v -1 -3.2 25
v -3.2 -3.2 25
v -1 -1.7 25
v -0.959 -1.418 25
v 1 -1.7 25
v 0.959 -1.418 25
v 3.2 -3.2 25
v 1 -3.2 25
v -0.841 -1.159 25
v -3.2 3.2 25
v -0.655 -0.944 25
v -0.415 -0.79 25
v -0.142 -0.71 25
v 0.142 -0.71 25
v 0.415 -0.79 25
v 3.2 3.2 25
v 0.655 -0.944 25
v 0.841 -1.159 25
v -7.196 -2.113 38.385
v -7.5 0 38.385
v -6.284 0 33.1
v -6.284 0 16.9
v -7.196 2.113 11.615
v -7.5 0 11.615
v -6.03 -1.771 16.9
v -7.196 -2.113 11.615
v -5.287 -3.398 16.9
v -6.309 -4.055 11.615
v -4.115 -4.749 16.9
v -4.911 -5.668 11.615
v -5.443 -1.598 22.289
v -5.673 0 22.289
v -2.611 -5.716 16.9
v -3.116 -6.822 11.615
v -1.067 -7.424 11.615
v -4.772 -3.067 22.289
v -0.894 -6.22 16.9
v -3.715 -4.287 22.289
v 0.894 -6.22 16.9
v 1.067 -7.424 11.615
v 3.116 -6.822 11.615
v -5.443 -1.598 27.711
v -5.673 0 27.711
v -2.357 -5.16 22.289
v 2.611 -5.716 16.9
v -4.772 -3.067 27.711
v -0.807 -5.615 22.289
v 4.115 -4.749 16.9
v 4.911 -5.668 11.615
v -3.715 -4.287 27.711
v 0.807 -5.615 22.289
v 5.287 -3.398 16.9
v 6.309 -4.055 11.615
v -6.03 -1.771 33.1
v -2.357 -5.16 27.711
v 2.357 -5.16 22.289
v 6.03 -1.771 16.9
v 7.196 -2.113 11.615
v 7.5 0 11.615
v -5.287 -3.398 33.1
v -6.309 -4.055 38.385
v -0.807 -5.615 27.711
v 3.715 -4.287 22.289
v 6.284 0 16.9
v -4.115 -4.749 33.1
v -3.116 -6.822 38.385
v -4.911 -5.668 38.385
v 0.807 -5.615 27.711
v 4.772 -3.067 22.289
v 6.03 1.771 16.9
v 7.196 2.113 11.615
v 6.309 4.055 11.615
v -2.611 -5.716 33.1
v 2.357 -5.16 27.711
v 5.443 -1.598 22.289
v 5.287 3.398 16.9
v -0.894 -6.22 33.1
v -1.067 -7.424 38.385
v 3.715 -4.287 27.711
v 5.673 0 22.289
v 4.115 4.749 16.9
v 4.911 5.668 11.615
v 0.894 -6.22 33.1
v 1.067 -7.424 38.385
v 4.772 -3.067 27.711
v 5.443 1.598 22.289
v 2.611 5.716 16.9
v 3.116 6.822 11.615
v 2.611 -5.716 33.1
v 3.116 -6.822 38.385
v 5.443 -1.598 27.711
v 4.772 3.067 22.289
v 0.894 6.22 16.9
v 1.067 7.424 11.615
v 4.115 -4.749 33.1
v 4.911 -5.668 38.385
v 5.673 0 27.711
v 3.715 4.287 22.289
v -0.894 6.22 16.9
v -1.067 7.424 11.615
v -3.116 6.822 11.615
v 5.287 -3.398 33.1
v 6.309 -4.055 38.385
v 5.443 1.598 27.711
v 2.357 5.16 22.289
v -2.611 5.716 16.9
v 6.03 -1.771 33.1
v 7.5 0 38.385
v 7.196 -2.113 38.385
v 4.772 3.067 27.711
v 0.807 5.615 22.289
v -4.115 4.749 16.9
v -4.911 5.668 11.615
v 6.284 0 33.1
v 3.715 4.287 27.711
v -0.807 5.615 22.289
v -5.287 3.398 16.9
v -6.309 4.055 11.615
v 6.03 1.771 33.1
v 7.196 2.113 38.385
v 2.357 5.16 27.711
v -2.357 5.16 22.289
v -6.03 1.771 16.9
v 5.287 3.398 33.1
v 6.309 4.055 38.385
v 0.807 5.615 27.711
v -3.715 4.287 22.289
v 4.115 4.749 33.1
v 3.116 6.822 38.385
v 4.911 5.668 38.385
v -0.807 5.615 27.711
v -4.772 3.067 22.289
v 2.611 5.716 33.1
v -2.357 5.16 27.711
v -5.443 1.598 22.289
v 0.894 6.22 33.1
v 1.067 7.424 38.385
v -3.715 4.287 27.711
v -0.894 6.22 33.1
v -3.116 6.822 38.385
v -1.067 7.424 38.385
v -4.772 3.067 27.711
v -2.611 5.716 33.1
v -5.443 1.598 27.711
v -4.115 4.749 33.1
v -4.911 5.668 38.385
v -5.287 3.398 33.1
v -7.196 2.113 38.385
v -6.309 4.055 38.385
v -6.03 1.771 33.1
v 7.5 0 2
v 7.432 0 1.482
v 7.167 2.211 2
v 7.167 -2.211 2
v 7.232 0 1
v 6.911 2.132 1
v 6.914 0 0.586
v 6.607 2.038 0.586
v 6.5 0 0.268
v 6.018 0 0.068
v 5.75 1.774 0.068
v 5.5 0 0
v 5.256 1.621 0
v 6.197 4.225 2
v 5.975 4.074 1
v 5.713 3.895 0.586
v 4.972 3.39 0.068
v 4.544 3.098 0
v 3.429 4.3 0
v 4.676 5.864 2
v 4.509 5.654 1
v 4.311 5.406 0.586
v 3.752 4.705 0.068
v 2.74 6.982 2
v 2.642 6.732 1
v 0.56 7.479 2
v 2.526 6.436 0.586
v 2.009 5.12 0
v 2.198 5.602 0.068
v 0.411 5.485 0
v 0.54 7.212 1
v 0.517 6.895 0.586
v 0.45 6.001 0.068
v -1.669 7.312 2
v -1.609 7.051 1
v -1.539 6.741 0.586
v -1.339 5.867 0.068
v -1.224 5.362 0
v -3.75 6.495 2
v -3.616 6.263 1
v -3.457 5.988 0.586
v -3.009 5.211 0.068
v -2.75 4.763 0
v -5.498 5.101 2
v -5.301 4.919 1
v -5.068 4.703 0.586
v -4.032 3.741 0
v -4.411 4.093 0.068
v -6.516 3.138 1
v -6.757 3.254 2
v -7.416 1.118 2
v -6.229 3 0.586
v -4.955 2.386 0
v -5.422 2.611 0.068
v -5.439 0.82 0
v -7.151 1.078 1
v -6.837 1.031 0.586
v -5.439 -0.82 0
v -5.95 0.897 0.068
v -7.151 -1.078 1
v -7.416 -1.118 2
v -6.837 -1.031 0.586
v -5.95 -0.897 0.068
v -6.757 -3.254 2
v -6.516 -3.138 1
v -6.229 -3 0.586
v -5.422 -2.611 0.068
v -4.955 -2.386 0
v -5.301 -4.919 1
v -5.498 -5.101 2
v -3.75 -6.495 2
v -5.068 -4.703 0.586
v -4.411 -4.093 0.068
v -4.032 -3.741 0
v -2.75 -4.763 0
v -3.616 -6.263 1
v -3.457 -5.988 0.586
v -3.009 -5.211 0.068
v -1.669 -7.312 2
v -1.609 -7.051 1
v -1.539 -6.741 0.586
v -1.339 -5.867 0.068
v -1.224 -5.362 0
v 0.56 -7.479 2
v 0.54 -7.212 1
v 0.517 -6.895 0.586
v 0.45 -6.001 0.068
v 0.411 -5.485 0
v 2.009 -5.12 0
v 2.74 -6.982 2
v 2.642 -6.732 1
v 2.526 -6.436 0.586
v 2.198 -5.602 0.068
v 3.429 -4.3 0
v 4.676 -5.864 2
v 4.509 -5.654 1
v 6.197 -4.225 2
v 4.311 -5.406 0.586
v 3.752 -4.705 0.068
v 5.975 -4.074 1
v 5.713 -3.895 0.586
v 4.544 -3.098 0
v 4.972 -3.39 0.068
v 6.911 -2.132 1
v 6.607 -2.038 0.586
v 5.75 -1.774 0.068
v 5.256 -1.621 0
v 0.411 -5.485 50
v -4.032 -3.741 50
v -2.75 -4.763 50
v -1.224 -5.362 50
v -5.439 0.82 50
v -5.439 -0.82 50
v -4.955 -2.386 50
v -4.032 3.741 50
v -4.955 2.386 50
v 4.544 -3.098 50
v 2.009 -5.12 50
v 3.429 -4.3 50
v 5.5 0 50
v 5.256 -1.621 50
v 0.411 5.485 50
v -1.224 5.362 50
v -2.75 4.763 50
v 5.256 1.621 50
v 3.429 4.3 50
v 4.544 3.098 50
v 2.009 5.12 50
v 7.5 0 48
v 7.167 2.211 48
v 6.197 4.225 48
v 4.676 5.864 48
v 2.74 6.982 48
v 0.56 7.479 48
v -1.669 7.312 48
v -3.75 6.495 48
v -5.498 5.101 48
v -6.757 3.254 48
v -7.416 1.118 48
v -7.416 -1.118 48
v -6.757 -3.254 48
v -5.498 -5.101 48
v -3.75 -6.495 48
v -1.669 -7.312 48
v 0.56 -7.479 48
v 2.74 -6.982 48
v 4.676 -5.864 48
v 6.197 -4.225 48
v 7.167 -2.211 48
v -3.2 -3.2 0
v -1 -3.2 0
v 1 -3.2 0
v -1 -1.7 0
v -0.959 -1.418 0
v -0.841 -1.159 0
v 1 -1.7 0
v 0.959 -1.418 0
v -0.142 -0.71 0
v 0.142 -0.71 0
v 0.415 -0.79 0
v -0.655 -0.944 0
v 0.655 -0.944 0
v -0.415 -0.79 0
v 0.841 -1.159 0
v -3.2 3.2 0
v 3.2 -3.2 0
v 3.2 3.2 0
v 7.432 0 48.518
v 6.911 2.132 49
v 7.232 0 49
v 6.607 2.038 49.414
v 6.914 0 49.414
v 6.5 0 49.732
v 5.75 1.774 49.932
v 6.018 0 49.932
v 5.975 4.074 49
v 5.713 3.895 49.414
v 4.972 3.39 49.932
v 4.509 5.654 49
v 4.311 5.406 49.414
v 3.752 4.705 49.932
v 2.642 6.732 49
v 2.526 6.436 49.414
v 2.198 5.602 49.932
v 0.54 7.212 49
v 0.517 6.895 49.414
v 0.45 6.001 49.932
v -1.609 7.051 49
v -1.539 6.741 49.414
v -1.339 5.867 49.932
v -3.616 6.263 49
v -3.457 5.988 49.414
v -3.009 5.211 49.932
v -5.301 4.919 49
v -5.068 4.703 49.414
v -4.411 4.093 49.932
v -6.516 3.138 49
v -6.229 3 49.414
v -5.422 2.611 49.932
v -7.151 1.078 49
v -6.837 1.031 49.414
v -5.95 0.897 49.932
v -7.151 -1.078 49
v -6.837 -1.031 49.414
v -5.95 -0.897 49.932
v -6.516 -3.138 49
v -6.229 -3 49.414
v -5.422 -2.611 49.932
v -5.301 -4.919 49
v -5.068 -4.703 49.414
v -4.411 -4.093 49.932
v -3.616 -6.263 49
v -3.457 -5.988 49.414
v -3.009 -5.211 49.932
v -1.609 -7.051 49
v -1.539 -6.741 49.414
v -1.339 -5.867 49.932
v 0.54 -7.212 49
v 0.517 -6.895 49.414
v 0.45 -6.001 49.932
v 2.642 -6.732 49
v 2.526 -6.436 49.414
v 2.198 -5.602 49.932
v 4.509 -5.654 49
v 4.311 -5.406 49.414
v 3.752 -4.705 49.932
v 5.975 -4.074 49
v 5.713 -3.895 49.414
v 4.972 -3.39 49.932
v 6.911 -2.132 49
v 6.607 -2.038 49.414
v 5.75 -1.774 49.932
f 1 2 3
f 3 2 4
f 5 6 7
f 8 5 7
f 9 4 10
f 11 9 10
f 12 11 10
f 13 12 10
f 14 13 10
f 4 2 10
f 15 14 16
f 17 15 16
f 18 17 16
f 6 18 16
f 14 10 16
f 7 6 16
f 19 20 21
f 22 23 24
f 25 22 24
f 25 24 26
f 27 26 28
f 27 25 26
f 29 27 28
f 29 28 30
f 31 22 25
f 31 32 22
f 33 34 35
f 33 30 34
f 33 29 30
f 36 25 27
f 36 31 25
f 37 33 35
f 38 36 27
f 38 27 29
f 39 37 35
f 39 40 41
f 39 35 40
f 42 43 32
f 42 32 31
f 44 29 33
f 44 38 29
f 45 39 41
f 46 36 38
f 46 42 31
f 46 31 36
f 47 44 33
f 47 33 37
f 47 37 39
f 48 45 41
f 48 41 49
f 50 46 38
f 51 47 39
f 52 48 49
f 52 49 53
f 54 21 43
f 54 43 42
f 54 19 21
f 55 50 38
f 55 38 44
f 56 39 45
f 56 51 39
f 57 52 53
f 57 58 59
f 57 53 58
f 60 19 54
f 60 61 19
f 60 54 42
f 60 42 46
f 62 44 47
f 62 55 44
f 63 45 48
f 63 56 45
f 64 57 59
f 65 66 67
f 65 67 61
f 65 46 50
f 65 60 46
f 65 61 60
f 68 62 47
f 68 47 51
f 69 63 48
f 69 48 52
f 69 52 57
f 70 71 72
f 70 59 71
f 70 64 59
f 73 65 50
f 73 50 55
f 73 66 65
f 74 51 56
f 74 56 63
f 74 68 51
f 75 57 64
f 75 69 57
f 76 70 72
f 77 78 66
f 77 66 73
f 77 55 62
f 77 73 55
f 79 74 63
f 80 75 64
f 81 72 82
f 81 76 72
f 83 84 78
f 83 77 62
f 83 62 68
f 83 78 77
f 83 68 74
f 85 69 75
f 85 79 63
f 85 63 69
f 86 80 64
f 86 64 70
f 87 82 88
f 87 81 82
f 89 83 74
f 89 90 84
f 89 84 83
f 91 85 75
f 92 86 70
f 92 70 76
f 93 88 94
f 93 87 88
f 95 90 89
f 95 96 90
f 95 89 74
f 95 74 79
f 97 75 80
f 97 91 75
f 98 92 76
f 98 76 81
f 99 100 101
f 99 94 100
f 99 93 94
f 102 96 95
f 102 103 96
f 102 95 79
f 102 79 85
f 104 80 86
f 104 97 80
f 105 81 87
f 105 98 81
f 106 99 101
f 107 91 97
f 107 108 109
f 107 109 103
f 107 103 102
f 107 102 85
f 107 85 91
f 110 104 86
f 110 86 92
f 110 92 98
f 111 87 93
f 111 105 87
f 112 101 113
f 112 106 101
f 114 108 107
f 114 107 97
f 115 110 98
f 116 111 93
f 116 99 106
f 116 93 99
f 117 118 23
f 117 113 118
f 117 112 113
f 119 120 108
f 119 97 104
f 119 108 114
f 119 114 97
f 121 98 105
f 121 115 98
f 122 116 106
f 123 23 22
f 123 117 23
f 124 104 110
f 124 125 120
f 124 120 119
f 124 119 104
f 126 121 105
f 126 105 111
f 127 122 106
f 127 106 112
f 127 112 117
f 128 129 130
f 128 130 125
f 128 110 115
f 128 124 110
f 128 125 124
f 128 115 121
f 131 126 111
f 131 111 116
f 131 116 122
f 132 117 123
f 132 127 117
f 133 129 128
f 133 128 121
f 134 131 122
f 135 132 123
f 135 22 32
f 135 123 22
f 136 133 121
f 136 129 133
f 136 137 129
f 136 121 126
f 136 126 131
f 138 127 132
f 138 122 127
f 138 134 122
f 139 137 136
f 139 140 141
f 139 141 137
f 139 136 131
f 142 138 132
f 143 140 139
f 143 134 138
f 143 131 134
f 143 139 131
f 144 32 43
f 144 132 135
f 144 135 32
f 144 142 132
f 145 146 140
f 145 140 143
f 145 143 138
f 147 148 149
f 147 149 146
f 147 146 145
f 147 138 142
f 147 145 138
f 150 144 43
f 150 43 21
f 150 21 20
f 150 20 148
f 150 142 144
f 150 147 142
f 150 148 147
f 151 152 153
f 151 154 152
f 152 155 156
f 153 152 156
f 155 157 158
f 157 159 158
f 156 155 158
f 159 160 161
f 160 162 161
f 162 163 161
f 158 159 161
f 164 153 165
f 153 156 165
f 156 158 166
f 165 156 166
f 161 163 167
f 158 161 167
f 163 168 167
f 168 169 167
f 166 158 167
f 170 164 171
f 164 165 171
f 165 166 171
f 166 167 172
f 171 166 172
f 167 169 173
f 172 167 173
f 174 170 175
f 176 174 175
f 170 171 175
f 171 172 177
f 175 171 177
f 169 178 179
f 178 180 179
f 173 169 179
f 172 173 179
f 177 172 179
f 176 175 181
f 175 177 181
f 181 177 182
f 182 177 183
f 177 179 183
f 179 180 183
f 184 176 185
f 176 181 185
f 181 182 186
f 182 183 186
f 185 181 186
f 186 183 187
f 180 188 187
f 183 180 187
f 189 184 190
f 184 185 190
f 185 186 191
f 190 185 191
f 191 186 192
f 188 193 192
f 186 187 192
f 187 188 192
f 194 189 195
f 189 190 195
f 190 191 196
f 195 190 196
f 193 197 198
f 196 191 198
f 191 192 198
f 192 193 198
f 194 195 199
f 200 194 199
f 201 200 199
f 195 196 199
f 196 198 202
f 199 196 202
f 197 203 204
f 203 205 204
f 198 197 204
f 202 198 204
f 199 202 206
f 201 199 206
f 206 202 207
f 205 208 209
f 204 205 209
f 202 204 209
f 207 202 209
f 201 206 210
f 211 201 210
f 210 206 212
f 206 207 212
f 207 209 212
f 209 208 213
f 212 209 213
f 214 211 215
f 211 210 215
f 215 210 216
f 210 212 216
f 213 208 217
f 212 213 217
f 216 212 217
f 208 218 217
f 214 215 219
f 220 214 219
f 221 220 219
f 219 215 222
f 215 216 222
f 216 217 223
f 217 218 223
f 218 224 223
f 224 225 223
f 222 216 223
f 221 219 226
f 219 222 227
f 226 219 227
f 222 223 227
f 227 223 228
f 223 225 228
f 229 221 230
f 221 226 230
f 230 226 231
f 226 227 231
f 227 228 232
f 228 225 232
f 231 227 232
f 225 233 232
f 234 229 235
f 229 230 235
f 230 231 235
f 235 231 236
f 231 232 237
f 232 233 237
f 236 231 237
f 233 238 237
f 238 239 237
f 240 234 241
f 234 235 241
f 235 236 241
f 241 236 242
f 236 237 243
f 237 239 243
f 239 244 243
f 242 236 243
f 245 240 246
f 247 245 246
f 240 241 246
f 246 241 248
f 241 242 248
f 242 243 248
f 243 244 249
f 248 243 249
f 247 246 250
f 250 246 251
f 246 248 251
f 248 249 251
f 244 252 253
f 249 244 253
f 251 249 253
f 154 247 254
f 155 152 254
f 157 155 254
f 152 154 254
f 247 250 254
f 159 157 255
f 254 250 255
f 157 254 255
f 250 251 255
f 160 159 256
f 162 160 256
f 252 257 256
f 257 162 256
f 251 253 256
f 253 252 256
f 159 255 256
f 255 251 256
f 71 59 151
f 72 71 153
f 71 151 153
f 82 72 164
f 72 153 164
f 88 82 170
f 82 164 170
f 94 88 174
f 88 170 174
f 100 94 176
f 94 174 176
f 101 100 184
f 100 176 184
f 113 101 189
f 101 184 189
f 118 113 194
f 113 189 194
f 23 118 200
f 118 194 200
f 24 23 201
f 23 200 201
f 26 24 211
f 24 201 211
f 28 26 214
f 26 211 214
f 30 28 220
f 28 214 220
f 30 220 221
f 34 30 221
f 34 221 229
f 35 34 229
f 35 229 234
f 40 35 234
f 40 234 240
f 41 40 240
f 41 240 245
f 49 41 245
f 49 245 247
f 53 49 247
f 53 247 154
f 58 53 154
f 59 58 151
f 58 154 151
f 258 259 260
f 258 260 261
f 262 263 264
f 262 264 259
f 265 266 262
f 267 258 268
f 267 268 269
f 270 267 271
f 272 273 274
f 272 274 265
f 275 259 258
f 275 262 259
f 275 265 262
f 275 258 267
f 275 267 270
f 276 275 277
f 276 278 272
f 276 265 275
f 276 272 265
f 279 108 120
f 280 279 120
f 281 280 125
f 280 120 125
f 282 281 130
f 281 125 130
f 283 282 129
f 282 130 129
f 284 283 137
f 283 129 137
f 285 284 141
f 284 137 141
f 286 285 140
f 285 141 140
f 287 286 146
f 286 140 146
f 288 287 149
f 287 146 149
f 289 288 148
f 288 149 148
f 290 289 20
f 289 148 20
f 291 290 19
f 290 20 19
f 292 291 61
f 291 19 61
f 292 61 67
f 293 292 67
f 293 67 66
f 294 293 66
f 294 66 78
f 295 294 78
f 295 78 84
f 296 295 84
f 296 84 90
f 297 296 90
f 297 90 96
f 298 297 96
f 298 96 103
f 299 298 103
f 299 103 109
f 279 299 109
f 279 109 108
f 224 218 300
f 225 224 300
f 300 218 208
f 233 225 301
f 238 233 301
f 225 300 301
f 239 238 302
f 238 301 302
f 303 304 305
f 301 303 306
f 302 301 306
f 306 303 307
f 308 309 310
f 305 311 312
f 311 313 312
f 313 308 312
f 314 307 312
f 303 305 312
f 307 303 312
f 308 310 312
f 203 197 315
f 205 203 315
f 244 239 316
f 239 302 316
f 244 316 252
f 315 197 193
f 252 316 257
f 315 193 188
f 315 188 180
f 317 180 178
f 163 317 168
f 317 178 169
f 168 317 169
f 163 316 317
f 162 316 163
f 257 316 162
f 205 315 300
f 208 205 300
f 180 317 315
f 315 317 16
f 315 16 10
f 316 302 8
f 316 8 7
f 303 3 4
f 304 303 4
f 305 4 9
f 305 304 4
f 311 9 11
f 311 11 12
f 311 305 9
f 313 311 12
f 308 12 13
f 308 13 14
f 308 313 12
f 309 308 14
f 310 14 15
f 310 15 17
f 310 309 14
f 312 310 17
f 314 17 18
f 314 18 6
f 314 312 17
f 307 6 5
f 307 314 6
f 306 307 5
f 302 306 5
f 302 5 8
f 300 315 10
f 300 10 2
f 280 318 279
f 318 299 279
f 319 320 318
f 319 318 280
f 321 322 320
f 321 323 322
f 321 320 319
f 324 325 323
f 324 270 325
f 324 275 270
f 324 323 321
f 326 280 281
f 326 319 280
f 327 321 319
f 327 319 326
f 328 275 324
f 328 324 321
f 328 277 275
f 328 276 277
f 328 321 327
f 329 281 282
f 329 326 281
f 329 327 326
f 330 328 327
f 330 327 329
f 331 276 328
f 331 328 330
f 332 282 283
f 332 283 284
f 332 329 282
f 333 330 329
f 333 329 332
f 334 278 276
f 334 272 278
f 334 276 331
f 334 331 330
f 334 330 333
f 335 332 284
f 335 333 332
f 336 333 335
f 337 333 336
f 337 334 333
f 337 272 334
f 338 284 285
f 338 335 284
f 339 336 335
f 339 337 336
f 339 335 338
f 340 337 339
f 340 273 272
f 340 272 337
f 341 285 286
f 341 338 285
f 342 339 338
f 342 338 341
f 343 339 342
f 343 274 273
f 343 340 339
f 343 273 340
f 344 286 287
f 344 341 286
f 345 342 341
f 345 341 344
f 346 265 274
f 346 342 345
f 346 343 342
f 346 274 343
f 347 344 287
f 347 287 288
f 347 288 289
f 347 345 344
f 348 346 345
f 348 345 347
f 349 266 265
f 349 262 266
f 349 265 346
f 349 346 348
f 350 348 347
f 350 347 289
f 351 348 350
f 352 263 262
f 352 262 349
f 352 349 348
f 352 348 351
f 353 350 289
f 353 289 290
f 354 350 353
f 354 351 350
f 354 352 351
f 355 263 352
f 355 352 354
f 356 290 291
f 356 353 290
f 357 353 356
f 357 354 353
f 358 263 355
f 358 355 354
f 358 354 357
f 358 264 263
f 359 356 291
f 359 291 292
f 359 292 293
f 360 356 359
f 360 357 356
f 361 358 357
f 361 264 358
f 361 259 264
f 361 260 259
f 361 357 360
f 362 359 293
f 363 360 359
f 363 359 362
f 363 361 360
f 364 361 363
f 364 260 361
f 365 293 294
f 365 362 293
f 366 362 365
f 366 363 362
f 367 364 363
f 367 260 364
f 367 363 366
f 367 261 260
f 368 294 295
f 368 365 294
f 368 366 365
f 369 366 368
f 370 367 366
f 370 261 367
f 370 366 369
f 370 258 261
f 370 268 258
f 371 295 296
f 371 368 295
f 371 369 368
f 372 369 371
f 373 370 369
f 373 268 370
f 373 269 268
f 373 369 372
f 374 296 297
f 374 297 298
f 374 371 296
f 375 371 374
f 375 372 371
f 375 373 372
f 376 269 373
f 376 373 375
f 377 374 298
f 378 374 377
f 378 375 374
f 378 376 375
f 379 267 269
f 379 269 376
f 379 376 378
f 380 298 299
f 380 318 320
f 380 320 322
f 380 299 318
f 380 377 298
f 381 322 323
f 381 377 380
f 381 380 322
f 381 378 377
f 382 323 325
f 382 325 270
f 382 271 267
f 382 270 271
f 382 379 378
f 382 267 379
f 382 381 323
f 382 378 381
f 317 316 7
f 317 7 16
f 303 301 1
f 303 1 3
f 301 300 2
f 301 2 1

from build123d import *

# Parameters (mm, degrees)
F0_R     = 7.5
F1_DEPTH = 50
F3_DEPTH = 25
F6_R     = 2


with BuildPart() as f1:
    # F0 (on Top) → F1 (new body)
    with BuildSketch(Plane.XY):
        Circle(F0_R)
    extrude(amount=F1_DEPTH)

    # F2 (on Top) → F3 (cut)
    with BuildSketch(Plane.XY):
        with BuildLine():
            Line((3.2, -3.2), (3.2, 3.2))
            Line((3.2, 3.2), (-3.2, 3.2))
            Line((-3.2, 3.2), (-3.2, -3.2))
            Line((-3.2, -3.2), (-1, -3.2))
            Line((-1, -3.2), (-1, -1.7))
            ThreePointArc((-1, -1.7), (0, -0.7), (1, -1.7))
            Line((1, -1.7), (1, -3.2))
            Line((1, -3.2), (3.2, -3.2))
        make_face()
    extrude(amount=F3_DEPTH, mode=Mode.SUBTRACT)

    # F4 (on Front) → F5 (revolve, cut)
    with BuildSketch(Plane.XZ):
        with BuildLine():
            ThreePointArc((-8, 10), (-5.596052, 25), (-8, 40))
            Line((-8, 40), (-13, 40))
            Line((-13, 40), (-13, 10))
            Line((-13, 10), (-8, 10))
        make_face()
    revolve(axis=Axis((0, 0, 50), (0, 0, 1)), mode=Mode.SUBTRACT)

    # F6
    f6_edges = [f1.edges().sort_by_distance(p)[0] for p in [
        (-7.5, 0, 50),
        (-7.5, 0, 0),
    ]]
    fillet(f6_edges, radius=F6_R)


solid = f1.part
